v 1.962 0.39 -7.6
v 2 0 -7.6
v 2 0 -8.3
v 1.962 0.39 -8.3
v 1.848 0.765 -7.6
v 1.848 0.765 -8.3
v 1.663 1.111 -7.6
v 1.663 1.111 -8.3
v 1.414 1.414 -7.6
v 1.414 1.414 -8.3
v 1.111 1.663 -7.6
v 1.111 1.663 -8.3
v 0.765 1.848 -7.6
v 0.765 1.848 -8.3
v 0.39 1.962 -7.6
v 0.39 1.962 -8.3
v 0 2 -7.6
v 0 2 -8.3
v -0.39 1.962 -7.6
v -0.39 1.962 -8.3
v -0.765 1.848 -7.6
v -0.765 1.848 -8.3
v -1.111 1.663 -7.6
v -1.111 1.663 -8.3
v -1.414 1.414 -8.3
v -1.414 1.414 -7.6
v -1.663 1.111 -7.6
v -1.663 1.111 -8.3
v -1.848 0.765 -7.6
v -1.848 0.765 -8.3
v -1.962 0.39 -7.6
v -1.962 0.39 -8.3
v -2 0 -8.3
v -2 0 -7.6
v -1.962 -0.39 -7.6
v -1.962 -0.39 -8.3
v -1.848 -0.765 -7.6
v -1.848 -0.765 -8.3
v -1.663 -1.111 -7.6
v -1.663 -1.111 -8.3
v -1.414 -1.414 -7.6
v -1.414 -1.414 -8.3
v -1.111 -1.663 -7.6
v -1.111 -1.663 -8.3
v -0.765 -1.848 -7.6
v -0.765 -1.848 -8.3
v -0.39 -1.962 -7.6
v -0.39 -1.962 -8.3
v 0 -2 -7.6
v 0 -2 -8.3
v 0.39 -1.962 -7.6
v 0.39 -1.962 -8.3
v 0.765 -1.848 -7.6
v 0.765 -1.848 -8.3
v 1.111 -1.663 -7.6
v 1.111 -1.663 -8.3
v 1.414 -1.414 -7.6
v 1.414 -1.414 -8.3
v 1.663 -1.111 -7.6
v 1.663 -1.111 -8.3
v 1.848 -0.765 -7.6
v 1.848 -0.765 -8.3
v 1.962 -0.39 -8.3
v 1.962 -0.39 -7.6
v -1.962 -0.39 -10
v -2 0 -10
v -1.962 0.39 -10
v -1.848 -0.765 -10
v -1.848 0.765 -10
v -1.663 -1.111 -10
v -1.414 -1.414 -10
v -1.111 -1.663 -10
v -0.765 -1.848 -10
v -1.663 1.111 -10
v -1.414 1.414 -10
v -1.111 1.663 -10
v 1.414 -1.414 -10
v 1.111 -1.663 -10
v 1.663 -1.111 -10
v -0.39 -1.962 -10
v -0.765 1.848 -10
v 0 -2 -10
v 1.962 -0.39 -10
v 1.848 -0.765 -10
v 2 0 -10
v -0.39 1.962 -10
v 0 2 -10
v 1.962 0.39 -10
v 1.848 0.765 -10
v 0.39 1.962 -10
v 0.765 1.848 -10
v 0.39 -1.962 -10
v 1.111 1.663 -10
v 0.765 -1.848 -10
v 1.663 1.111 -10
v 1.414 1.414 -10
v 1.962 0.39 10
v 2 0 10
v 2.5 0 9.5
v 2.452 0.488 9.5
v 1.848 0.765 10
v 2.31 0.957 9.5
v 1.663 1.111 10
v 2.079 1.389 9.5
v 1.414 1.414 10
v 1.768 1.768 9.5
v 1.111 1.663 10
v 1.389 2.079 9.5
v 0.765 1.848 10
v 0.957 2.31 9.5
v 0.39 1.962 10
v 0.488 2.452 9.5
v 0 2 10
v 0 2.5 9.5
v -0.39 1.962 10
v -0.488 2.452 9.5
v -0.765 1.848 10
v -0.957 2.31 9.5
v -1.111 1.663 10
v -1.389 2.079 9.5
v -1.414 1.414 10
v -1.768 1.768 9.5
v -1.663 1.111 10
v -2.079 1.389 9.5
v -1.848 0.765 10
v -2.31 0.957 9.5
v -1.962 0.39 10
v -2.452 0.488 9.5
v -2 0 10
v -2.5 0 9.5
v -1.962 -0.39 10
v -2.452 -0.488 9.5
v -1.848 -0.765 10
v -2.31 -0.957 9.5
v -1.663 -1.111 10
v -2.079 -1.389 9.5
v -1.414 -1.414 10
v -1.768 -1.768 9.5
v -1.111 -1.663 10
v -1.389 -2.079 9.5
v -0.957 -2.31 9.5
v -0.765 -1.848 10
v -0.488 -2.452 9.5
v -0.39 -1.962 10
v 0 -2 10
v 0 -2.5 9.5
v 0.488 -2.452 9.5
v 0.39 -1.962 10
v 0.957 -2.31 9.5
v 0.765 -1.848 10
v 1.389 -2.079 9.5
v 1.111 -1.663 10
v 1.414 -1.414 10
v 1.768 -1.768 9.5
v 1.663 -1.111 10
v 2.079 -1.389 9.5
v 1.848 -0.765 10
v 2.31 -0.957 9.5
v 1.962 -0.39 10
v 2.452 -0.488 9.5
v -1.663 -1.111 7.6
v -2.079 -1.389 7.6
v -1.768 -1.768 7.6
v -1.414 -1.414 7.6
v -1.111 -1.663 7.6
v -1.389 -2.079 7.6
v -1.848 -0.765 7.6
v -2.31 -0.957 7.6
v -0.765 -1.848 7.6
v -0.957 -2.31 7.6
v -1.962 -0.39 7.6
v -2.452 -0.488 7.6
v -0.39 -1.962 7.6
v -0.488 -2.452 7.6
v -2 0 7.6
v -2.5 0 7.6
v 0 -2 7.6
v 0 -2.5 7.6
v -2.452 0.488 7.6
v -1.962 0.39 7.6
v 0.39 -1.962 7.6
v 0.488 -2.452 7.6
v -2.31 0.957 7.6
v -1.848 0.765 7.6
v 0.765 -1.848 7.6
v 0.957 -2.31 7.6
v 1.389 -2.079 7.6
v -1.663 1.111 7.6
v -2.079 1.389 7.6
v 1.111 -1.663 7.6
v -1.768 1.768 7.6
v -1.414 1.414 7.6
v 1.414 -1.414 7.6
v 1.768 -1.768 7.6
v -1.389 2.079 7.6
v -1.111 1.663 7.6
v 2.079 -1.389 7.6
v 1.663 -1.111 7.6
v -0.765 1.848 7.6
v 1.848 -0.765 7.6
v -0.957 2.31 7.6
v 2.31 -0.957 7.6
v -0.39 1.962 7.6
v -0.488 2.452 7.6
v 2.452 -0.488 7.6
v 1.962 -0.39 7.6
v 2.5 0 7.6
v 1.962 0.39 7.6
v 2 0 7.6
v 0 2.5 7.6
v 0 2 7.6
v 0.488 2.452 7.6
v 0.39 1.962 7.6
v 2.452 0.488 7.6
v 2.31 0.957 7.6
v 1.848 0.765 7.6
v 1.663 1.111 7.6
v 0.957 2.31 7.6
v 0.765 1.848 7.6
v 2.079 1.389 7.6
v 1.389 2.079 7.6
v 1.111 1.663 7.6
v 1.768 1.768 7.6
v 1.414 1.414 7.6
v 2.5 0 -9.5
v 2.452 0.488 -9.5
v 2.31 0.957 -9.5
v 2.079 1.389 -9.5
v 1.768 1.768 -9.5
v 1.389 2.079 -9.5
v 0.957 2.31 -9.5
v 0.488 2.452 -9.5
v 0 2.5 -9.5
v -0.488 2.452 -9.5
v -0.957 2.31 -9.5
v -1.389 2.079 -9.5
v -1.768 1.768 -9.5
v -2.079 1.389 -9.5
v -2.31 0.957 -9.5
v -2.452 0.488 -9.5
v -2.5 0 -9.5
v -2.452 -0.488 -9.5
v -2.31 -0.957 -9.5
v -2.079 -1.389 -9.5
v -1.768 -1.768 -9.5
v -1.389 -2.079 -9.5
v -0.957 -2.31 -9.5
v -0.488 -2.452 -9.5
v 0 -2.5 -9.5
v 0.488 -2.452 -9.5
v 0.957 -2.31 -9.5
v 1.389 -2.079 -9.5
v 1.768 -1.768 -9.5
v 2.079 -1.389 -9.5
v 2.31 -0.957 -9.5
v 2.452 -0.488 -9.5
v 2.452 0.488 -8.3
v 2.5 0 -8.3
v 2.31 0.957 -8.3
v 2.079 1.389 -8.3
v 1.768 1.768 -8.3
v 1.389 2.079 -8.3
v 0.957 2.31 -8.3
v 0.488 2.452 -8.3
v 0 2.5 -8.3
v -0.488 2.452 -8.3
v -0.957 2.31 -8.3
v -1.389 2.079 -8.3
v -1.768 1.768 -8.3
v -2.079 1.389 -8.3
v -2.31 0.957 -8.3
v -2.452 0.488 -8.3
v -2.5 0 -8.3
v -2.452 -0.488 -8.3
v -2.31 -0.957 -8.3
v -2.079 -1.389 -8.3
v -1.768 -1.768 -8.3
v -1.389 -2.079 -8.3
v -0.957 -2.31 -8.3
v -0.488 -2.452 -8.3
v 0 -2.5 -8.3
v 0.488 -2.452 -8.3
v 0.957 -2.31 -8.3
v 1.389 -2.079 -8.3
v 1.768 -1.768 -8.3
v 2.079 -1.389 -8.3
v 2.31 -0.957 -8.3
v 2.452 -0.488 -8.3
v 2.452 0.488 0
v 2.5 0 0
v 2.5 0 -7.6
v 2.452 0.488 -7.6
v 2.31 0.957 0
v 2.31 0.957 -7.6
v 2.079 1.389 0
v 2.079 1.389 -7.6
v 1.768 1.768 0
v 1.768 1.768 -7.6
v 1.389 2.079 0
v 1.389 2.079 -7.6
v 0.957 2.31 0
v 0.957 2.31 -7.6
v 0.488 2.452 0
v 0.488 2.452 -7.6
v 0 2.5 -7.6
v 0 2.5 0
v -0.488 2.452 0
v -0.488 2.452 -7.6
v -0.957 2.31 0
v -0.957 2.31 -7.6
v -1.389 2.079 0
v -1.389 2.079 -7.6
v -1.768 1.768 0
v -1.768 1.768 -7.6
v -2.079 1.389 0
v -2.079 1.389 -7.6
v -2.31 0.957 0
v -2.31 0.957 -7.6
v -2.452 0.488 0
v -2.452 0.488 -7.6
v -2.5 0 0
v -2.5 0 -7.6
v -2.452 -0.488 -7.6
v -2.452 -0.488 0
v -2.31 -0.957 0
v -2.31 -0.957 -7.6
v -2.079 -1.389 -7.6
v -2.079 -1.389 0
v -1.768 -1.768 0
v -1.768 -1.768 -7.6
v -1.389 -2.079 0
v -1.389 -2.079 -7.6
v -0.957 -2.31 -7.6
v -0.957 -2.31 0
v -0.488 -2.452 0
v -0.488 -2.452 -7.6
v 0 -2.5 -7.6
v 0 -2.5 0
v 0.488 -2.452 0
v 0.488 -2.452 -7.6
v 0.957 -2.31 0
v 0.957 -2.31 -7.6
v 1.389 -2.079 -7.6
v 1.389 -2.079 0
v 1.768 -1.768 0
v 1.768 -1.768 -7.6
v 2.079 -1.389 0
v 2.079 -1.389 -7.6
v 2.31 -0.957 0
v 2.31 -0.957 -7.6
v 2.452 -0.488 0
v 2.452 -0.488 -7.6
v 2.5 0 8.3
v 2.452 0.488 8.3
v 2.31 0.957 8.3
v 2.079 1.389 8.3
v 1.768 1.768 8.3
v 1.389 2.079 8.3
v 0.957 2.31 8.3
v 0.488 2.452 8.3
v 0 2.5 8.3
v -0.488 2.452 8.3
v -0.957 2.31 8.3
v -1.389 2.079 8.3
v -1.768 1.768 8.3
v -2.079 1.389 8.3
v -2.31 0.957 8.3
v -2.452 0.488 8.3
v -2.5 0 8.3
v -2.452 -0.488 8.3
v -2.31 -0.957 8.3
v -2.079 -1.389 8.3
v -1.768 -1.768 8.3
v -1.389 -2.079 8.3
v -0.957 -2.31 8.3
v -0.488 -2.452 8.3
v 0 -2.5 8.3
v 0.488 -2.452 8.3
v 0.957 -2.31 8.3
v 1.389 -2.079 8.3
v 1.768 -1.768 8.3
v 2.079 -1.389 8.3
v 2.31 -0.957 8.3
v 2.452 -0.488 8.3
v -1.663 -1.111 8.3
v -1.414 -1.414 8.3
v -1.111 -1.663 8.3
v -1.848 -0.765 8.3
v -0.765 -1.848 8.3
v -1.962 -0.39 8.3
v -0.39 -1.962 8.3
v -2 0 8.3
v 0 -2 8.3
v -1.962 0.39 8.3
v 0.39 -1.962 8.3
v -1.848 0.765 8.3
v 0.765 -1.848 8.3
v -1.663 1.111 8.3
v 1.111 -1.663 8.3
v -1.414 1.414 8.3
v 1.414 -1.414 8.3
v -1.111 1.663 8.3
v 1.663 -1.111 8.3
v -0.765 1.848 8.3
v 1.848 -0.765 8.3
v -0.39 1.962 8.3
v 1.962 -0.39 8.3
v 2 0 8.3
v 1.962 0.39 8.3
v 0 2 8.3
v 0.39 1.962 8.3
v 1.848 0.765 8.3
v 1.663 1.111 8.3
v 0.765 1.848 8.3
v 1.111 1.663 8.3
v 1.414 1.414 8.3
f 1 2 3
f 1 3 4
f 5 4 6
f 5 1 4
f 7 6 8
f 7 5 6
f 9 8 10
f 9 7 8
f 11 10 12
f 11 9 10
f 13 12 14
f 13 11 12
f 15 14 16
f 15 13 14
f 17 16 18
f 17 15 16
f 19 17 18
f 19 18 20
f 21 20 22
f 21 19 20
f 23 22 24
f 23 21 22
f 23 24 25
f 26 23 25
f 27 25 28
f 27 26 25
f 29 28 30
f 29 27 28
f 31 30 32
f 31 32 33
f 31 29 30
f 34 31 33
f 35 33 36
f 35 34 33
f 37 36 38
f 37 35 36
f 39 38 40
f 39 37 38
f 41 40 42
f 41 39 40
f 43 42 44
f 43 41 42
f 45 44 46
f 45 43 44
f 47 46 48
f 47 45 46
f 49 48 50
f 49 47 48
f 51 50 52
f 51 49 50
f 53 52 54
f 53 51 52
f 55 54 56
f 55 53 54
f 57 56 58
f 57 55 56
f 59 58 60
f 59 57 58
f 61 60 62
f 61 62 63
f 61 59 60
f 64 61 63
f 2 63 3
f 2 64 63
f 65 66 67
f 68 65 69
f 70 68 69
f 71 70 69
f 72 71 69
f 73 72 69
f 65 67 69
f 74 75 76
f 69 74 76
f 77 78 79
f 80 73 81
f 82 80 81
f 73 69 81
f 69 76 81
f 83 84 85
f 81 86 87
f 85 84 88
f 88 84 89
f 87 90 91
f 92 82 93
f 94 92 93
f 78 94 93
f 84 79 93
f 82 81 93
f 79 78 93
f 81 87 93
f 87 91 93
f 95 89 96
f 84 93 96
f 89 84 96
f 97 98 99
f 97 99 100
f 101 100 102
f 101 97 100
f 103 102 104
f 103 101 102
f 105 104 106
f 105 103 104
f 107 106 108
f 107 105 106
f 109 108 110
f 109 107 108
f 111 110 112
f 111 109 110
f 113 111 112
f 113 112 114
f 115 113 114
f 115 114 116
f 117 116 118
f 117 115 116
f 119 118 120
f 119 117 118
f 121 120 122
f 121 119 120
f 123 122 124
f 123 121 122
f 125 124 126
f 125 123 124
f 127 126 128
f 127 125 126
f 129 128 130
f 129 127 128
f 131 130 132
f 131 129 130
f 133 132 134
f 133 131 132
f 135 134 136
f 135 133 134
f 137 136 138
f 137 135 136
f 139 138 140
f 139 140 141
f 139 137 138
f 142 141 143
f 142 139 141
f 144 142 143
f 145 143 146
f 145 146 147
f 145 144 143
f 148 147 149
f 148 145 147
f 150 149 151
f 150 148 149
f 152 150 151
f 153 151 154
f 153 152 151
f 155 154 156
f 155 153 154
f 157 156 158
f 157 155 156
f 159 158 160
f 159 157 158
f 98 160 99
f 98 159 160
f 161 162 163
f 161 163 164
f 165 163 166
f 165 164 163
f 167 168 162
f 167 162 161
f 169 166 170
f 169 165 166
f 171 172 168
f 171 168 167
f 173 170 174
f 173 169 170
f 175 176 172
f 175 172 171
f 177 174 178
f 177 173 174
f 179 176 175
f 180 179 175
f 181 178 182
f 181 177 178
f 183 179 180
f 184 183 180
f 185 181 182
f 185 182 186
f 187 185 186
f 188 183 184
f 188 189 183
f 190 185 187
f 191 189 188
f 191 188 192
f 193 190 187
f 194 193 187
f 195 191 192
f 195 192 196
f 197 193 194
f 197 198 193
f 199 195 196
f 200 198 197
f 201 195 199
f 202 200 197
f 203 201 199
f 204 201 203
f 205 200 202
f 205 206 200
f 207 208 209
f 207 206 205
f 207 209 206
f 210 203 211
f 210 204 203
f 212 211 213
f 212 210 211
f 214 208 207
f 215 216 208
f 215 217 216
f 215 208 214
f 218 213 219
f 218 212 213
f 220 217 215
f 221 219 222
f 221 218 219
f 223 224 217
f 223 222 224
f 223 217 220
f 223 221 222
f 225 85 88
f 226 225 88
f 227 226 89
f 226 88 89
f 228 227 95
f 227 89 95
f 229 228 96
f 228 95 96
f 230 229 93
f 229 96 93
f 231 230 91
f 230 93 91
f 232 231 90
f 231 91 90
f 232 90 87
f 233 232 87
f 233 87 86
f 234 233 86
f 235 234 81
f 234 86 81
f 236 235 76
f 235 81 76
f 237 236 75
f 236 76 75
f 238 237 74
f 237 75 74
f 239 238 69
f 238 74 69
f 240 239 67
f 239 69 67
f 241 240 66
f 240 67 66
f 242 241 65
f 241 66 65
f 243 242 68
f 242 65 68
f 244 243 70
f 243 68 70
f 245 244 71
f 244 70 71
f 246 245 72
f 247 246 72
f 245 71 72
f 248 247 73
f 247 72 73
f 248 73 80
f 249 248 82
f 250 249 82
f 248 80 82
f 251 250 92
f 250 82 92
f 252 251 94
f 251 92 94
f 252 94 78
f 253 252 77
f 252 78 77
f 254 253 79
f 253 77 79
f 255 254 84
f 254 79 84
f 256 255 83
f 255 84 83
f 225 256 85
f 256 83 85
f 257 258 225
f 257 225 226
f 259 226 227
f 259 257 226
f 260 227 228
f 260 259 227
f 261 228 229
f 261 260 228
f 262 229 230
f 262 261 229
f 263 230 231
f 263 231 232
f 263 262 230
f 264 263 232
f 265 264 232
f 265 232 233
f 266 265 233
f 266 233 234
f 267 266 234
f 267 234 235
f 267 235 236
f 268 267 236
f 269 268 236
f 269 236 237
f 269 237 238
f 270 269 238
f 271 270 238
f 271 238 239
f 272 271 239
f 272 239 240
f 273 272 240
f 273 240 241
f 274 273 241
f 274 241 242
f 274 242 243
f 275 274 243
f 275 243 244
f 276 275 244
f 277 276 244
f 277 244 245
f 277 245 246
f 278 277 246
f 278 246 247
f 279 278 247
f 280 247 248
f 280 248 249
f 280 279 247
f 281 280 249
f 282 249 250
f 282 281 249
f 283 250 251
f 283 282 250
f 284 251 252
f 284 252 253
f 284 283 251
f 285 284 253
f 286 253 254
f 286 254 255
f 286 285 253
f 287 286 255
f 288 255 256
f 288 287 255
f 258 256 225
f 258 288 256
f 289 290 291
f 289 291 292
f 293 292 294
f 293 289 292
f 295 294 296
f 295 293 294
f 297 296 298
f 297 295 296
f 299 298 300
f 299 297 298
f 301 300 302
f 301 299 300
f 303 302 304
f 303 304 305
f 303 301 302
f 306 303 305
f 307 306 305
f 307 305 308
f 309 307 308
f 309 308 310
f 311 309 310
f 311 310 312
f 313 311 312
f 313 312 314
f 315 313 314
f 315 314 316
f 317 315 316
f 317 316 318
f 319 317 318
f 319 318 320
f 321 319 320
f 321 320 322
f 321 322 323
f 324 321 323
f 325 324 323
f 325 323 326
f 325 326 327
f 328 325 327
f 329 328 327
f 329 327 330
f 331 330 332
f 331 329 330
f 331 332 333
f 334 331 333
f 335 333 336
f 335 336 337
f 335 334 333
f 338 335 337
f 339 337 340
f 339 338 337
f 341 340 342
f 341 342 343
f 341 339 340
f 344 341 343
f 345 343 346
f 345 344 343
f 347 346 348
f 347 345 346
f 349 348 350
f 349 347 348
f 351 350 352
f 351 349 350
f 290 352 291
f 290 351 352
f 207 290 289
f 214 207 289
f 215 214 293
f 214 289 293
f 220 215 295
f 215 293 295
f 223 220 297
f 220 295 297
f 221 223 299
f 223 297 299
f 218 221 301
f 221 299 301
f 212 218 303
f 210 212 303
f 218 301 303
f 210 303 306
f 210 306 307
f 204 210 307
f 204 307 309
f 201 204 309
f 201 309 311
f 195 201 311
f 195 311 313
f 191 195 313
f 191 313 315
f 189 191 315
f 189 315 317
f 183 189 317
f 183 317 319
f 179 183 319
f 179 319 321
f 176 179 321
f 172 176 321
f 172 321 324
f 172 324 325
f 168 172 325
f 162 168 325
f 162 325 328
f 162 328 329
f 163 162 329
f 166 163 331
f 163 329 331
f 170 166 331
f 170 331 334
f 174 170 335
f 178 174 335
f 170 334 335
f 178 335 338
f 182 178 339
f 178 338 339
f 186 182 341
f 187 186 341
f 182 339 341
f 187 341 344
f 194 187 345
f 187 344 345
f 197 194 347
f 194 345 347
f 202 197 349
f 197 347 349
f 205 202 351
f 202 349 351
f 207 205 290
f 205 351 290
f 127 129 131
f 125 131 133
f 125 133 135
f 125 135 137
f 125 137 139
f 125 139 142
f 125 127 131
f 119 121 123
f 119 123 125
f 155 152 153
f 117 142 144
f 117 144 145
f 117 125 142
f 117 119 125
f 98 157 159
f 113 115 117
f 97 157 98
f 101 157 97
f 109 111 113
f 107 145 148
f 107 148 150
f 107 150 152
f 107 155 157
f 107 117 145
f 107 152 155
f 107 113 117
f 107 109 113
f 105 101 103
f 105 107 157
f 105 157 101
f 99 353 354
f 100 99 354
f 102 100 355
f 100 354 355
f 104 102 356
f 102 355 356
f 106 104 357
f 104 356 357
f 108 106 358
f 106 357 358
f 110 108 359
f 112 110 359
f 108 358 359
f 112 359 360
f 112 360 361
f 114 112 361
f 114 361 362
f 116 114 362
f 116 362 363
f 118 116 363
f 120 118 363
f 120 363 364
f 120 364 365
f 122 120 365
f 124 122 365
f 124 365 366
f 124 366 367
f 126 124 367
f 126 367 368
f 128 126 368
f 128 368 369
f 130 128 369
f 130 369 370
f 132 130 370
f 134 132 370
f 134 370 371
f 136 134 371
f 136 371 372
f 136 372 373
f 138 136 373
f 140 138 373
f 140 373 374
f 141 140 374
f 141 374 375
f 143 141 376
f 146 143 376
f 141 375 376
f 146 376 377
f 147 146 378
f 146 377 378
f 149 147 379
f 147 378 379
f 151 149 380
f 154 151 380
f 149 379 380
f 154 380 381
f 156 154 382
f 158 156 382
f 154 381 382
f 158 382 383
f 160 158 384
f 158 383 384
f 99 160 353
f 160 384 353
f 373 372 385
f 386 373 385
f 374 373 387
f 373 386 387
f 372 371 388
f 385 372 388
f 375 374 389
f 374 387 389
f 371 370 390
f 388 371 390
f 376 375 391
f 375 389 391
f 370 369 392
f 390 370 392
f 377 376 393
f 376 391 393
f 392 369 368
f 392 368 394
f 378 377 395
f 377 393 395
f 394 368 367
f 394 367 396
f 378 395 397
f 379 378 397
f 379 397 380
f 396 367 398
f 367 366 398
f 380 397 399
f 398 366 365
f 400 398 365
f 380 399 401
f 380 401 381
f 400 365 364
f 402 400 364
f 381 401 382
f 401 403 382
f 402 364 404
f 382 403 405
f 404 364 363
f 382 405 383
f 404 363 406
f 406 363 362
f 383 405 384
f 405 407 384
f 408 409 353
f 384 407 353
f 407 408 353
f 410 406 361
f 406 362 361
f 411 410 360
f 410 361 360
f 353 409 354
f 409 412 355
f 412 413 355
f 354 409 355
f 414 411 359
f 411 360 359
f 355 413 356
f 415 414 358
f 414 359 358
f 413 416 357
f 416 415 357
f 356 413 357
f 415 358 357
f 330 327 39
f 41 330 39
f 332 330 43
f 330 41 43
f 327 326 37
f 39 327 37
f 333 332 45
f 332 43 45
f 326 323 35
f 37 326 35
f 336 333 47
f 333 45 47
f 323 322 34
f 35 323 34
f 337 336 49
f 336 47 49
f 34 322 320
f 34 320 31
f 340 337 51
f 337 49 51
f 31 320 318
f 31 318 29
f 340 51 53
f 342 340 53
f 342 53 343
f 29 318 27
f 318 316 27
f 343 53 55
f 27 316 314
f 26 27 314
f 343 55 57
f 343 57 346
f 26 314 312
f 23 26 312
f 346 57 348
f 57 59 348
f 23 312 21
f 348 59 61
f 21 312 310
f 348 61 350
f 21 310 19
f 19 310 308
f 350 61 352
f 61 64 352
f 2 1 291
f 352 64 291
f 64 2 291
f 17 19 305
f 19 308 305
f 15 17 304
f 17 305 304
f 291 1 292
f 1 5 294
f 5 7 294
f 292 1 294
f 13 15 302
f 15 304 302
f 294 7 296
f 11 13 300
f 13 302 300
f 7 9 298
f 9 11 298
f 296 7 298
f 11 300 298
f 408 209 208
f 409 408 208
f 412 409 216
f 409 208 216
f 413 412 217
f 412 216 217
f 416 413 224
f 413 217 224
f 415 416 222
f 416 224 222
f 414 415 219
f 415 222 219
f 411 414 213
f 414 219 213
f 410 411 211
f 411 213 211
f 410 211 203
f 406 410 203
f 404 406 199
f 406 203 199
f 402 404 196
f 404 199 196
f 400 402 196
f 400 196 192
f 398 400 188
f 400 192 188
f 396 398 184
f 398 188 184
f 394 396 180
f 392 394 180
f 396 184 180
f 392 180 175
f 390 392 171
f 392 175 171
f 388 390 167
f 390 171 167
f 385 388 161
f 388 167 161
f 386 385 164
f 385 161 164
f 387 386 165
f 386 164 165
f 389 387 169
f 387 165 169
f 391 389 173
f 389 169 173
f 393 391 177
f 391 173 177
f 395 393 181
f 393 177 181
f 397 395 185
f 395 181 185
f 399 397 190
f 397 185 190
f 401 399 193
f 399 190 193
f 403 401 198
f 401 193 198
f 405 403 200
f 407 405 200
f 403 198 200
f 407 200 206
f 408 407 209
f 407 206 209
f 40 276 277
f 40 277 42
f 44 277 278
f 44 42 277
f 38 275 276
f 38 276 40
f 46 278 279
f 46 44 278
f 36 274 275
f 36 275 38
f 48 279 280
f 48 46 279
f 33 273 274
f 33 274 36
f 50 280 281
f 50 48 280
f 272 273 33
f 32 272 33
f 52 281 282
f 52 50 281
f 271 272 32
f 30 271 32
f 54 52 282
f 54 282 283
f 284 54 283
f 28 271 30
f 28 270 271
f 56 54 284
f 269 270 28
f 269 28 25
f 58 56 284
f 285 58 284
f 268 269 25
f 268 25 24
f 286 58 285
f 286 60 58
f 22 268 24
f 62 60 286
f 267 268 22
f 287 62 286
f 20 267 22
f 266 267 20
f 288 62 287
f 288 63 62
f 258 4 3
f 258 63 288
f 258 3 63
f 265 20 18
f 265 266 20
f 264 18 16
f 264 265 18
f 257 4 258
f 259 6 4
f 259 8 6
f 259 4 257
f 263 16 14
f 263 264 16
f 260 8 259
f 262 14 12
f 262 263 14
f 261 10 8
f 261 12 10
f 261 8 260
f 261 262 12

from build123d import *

# Parameters (mm, degrees)
F1_R     = 2.5
F2_DEPTH = 10
F3_R     = 2.5
F3_R_2   = 2
F4_DEPTH = 0.7
F6_SIZE  = 0.5


with BuildPart() as f2:
    # F1 (on Top) → F2 (new body)
    with BuildSketch(Plane.XY):
        Circle(F1_R)
    extrude(amount=F2_DEPTH)

    # F3 (on offset) → F4 (cut)
    with BuildSketch(Plane.XY.offset(7.6)):
        Circle(F3_R)
        Circle(F3_R_2, mode=Mode.SUBTRACT)
    extrude(amount=F4_DEPTH, mode=Mode.SUBTRACT)

    # F5: F2 across plane


with BuildPart() as f2_1:
    add(f2.part)
    add(f2.part.mirror(Plane.XY))

    # F6
    f6_edges = [f2_1.edges().sort_by_distance(p)[0] for p in [
        (-2.5, 0, 10),
        (-2.5, 0, -10),
    ]]
    chamfer(f6_edges, length=F6_SIZE)


solid = f2_1.part
